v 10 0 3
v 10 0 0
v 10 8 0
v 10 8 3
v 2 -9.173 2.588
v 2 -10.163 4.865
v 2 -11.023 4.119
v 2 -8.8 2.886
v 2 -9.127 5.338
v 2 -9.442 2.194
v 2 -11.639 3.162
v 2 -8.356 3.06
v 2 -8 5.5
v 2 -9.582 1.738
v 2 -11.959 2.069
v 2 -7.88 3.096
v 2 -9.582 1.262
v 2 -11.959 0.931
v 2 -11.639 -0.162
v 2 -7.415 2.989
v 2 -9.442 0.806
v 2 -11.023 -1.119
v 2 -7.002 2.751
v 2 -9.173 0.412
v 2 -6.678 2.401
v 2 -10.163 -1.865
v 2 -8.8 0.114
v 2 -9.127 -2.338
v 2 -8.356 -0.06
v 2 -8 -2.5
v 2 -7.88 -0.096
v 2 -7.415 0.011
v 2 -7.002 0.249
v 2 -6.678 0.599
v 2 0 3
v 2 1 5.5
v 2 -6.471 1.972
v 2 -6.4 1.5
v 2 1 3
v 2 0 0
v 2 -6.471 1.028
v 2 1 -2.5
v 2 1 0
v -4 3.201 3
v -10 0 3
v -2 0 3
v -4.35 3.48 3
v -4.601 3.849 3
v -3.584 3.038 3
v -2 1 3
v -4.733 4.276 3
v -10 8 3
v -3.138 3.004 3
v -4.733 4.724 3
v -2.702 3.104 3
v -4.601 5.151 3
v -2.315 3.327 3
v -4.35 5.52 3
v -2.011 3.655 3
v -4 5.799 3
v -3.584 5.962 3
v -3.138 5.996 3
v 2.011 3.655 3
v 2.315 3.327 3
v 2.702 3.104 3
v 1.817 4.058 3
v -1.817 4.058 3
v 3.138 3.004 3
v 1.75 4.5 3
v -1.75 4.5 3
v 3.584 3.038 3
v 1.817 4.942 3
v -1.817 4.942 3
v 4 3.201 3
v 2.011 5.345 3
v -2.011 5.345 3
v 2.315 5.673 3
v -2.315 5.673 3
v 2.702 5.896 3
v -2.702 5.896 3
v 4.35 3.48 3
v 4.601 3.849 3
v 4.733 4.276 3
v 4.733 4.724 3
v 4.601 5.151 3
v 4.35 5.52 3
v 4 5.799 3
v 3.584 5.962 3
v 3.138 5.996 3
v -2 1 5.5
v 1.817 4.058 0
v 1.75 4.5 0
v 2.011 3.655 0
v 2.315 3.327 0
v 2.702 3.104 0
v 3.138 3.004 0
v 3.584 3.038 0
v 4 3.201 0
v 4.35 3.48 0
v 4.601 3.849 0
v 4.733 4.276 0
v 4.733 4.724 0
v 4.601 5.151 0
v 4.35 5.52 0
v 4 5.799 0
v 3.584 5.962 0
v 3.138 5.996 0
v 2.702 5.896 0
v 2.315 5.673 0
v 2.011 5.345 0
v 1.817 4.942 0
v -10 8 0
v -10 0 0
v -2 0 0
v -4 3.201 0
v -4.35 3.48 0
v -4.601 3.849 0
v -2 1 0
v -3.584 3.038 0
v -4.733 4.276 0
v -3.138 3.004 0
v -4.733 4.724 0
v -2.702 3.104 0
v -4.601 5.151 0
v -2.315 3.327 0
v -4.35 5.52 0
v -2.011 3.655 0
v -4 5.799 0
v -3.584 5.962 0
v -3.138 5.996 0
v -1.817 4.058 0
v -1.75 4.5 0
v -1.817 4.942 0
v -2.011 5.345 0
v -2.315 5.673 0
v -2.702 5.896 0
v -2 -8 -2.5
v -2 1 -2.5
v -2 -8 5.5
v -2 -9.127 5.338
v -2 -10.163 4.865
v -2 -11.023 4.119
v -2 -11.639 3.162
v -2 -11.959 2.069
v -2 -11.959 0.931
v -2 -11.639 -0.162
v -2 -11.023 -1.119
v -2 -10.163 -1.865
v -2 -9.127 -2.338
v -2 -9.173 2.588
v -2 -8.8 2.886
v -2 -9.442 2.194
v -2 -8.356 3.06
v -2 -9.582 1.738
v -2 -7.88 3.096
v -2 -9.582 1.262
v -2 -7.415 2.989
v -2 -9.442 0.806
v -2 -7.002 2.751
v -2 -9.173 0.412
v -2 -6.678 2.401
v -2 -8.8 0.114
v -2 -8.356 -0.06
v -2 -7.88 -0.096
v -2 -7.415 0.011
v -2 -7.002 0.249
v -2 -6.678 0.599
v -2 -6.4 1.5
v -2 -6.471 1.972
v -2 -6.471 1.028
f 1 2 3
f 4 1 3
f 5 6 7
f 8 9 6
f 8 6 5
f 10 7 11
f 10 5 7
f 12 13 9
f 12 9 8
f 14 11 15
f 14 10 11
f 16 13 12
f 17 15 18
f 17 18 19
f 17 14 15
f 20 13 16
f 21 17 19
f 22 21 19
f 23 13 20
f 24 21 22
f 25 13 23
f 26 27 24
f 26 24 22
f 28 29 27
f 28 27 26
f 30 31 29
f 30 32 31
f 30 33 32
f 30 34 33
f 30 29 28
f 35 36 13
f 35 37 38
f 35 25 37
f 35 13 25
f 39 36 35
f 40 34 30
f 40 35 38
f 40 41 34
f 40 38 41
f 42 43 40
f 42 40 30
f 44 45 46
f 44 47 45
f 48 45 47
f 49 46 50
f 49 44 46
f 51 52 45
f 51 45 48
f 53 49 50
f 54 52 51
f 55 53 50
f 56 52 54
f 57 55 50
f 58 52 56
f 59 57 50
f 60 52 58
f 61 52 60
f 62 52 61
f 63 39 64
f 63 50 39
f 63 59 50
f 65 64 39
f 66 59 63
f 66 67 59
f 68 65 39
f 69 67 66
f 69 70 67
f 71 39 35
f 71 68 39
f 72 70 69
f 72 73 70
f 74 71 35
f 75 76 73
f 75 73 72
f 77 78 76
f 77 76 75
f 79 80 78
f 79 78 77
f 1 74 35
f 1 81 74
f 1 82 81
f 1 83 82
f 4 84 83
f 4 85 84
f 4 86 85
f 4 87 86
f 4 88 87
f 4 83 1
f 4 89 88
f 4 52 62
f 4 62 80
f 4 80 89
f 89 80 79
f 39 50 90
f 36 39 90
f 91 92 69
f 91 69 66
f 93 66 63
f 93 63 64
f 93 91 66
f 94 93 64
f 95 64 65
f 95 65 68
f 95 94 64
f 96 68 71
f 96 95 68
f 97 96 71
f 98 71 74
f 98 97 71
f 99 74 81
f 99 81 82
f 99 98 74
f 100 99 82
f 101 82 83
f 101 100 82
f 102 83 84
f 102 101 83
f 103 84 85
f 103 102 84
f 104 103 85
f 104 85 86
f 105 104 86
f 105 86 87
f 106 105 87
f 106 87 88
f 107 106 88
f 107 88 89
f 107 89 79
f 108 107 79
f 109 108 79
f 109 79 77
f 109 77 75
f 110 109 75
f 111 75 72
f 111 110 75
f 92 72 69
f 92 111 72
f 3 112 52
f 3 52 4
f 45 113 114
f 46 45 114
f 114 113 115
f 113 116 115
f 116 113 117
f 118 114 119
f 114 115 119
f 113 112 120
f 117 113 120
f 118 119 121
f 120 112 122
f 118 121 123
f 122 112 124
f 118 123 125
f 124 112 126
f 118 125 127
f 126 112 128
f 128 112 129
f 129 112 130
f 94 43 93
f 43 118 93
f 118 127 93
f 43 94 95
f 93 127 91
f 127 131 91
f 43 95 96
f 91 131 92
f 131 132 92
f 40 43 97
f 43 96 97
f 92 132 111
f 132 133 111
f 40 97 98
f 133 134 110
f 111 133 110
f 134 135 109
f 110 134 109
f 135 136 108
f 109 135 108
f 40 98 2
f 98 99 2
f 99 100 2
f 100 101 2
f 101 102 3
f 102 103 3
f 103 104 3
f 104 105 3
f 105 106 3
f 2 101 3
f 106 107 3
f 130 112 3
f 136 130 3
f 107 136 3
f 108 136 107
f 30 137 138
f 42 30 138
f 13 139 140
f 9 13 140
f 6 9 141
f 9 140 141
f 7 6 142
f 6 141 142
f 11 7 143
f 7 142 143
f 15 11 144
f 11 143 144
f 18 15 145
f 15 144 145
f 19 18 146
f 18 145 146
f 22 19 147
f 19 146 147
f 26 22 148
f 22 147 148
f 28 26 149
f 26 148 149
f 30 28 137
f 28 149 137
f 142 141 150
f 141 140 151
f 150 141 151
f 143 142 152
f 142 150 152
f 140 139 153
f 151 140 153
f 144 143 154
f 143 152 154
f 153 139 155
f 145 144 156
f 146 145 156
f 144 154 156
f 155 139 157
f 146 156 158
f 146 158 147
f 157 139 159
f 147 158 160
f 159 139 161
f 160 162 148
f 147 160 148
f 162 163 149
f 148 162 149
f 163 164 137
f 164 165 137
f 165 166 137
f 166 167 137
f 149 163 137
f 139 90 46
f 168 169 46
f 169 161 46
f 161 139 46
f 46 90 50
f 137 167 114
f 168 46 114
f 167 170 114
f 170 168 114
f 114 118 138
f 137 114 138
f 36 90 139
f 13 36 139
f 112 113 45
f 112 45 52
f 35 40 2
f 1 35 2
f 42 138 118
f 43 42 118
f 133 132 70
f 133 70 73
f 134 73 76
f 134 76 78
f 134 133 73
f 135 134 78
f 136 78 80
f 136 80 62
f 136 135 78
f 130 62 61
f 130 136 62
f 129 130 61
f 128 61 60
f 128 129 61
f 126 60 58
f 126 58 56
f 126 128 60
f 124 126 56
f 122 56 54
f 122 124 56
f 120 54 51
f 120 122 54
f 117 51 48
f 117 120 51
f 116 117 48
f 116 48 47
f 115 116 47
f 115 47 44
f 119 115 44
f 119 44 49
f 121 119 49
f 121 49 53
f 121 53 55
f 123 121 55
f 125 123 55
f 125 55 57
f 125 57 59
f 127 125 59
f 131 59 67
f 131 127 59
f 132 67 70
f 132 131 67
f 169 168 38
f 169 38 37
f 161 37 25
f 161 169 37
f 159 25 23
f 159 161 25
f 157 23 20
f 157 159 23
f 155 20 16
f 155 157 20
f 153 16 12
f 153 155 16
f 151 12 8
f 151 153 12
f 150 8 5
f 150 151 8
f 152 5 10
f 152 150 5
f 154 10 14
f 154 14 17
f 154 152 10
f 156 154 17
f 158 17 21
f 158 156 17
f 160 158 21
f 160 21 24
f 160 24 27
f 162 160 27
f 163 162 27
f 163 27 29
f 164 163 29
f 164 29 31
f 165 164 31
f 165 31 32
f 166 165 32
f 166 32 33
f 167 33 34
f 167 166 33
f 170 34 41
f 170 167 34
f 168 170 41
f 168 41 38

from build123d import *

# Parameters (mm, degrees)
SKETCH2_W           = 20
SKETCH2_H           = 8
SKETCH2_R           = 1.5
BOSS_EXTRUDE3_DEPTH = 3
BOSS_EXTRUDE4_START = -12
SKETCH5_R           = 1.6
BOSS_EXTRUDE4_DEPTH = 4


with BuildPart() as part:
    # Sketch2 → Boss-Extrude3 (new body)
    with BuildSketch(Plane.XY):
        with Locations((0, 4)):
            Rectangle(SKETCH2_W, SKETCH2_H)
        with Locations((-3.25, 4.5)):
            Circle(SKETCH2_R, mode=Mode.SUBTRACT)
        with Locations(Location((3.25, 4.5, 0), (0, 0, 180))):
            Circle(SKETCH2_R, mode=Mode.SUBTRACT)
    extrude(amount=BOSS_EXTRUDE3_DEPTH)

    # Sketch5 → Boss-Extrude4 (add)
    with BuildSketch(Plane(origin=(10, 0, 0), x_dir=(0, 0, -1), z_dir=(1, 0, 0)).offset(BOSS_EXTRUDE4_START)):
        with BuildLine():
            Line((-5.5, 0), (-5.5, -8))
            ThreePointArc((-5.5, -8), (-1.5, -12), (2.5, -8))
            Line((2.5, -8), (2.5, 0))
            Line((2.5, 0), (2.5, 1))
            Line((2.5, 1), (0, 1))
            Line((0, 1), (0, 0))
            Line((0, 0), (-3, 0))
            Line((-3, 0), (-3, 1))
            Line((-3, 1), (-5.5, 1))
            Line((-5.5, 1), (-5.5, 0))
        make_face()
        with Locations(Location((-1.5, -8, 0), (0, 0, 90))):
            Circle(SKETCH5_R, mode=Mode.SUBTRACT)
    extrude(amount=BOSS_EXTRUDE4_DEPTH)


solid = part.part
